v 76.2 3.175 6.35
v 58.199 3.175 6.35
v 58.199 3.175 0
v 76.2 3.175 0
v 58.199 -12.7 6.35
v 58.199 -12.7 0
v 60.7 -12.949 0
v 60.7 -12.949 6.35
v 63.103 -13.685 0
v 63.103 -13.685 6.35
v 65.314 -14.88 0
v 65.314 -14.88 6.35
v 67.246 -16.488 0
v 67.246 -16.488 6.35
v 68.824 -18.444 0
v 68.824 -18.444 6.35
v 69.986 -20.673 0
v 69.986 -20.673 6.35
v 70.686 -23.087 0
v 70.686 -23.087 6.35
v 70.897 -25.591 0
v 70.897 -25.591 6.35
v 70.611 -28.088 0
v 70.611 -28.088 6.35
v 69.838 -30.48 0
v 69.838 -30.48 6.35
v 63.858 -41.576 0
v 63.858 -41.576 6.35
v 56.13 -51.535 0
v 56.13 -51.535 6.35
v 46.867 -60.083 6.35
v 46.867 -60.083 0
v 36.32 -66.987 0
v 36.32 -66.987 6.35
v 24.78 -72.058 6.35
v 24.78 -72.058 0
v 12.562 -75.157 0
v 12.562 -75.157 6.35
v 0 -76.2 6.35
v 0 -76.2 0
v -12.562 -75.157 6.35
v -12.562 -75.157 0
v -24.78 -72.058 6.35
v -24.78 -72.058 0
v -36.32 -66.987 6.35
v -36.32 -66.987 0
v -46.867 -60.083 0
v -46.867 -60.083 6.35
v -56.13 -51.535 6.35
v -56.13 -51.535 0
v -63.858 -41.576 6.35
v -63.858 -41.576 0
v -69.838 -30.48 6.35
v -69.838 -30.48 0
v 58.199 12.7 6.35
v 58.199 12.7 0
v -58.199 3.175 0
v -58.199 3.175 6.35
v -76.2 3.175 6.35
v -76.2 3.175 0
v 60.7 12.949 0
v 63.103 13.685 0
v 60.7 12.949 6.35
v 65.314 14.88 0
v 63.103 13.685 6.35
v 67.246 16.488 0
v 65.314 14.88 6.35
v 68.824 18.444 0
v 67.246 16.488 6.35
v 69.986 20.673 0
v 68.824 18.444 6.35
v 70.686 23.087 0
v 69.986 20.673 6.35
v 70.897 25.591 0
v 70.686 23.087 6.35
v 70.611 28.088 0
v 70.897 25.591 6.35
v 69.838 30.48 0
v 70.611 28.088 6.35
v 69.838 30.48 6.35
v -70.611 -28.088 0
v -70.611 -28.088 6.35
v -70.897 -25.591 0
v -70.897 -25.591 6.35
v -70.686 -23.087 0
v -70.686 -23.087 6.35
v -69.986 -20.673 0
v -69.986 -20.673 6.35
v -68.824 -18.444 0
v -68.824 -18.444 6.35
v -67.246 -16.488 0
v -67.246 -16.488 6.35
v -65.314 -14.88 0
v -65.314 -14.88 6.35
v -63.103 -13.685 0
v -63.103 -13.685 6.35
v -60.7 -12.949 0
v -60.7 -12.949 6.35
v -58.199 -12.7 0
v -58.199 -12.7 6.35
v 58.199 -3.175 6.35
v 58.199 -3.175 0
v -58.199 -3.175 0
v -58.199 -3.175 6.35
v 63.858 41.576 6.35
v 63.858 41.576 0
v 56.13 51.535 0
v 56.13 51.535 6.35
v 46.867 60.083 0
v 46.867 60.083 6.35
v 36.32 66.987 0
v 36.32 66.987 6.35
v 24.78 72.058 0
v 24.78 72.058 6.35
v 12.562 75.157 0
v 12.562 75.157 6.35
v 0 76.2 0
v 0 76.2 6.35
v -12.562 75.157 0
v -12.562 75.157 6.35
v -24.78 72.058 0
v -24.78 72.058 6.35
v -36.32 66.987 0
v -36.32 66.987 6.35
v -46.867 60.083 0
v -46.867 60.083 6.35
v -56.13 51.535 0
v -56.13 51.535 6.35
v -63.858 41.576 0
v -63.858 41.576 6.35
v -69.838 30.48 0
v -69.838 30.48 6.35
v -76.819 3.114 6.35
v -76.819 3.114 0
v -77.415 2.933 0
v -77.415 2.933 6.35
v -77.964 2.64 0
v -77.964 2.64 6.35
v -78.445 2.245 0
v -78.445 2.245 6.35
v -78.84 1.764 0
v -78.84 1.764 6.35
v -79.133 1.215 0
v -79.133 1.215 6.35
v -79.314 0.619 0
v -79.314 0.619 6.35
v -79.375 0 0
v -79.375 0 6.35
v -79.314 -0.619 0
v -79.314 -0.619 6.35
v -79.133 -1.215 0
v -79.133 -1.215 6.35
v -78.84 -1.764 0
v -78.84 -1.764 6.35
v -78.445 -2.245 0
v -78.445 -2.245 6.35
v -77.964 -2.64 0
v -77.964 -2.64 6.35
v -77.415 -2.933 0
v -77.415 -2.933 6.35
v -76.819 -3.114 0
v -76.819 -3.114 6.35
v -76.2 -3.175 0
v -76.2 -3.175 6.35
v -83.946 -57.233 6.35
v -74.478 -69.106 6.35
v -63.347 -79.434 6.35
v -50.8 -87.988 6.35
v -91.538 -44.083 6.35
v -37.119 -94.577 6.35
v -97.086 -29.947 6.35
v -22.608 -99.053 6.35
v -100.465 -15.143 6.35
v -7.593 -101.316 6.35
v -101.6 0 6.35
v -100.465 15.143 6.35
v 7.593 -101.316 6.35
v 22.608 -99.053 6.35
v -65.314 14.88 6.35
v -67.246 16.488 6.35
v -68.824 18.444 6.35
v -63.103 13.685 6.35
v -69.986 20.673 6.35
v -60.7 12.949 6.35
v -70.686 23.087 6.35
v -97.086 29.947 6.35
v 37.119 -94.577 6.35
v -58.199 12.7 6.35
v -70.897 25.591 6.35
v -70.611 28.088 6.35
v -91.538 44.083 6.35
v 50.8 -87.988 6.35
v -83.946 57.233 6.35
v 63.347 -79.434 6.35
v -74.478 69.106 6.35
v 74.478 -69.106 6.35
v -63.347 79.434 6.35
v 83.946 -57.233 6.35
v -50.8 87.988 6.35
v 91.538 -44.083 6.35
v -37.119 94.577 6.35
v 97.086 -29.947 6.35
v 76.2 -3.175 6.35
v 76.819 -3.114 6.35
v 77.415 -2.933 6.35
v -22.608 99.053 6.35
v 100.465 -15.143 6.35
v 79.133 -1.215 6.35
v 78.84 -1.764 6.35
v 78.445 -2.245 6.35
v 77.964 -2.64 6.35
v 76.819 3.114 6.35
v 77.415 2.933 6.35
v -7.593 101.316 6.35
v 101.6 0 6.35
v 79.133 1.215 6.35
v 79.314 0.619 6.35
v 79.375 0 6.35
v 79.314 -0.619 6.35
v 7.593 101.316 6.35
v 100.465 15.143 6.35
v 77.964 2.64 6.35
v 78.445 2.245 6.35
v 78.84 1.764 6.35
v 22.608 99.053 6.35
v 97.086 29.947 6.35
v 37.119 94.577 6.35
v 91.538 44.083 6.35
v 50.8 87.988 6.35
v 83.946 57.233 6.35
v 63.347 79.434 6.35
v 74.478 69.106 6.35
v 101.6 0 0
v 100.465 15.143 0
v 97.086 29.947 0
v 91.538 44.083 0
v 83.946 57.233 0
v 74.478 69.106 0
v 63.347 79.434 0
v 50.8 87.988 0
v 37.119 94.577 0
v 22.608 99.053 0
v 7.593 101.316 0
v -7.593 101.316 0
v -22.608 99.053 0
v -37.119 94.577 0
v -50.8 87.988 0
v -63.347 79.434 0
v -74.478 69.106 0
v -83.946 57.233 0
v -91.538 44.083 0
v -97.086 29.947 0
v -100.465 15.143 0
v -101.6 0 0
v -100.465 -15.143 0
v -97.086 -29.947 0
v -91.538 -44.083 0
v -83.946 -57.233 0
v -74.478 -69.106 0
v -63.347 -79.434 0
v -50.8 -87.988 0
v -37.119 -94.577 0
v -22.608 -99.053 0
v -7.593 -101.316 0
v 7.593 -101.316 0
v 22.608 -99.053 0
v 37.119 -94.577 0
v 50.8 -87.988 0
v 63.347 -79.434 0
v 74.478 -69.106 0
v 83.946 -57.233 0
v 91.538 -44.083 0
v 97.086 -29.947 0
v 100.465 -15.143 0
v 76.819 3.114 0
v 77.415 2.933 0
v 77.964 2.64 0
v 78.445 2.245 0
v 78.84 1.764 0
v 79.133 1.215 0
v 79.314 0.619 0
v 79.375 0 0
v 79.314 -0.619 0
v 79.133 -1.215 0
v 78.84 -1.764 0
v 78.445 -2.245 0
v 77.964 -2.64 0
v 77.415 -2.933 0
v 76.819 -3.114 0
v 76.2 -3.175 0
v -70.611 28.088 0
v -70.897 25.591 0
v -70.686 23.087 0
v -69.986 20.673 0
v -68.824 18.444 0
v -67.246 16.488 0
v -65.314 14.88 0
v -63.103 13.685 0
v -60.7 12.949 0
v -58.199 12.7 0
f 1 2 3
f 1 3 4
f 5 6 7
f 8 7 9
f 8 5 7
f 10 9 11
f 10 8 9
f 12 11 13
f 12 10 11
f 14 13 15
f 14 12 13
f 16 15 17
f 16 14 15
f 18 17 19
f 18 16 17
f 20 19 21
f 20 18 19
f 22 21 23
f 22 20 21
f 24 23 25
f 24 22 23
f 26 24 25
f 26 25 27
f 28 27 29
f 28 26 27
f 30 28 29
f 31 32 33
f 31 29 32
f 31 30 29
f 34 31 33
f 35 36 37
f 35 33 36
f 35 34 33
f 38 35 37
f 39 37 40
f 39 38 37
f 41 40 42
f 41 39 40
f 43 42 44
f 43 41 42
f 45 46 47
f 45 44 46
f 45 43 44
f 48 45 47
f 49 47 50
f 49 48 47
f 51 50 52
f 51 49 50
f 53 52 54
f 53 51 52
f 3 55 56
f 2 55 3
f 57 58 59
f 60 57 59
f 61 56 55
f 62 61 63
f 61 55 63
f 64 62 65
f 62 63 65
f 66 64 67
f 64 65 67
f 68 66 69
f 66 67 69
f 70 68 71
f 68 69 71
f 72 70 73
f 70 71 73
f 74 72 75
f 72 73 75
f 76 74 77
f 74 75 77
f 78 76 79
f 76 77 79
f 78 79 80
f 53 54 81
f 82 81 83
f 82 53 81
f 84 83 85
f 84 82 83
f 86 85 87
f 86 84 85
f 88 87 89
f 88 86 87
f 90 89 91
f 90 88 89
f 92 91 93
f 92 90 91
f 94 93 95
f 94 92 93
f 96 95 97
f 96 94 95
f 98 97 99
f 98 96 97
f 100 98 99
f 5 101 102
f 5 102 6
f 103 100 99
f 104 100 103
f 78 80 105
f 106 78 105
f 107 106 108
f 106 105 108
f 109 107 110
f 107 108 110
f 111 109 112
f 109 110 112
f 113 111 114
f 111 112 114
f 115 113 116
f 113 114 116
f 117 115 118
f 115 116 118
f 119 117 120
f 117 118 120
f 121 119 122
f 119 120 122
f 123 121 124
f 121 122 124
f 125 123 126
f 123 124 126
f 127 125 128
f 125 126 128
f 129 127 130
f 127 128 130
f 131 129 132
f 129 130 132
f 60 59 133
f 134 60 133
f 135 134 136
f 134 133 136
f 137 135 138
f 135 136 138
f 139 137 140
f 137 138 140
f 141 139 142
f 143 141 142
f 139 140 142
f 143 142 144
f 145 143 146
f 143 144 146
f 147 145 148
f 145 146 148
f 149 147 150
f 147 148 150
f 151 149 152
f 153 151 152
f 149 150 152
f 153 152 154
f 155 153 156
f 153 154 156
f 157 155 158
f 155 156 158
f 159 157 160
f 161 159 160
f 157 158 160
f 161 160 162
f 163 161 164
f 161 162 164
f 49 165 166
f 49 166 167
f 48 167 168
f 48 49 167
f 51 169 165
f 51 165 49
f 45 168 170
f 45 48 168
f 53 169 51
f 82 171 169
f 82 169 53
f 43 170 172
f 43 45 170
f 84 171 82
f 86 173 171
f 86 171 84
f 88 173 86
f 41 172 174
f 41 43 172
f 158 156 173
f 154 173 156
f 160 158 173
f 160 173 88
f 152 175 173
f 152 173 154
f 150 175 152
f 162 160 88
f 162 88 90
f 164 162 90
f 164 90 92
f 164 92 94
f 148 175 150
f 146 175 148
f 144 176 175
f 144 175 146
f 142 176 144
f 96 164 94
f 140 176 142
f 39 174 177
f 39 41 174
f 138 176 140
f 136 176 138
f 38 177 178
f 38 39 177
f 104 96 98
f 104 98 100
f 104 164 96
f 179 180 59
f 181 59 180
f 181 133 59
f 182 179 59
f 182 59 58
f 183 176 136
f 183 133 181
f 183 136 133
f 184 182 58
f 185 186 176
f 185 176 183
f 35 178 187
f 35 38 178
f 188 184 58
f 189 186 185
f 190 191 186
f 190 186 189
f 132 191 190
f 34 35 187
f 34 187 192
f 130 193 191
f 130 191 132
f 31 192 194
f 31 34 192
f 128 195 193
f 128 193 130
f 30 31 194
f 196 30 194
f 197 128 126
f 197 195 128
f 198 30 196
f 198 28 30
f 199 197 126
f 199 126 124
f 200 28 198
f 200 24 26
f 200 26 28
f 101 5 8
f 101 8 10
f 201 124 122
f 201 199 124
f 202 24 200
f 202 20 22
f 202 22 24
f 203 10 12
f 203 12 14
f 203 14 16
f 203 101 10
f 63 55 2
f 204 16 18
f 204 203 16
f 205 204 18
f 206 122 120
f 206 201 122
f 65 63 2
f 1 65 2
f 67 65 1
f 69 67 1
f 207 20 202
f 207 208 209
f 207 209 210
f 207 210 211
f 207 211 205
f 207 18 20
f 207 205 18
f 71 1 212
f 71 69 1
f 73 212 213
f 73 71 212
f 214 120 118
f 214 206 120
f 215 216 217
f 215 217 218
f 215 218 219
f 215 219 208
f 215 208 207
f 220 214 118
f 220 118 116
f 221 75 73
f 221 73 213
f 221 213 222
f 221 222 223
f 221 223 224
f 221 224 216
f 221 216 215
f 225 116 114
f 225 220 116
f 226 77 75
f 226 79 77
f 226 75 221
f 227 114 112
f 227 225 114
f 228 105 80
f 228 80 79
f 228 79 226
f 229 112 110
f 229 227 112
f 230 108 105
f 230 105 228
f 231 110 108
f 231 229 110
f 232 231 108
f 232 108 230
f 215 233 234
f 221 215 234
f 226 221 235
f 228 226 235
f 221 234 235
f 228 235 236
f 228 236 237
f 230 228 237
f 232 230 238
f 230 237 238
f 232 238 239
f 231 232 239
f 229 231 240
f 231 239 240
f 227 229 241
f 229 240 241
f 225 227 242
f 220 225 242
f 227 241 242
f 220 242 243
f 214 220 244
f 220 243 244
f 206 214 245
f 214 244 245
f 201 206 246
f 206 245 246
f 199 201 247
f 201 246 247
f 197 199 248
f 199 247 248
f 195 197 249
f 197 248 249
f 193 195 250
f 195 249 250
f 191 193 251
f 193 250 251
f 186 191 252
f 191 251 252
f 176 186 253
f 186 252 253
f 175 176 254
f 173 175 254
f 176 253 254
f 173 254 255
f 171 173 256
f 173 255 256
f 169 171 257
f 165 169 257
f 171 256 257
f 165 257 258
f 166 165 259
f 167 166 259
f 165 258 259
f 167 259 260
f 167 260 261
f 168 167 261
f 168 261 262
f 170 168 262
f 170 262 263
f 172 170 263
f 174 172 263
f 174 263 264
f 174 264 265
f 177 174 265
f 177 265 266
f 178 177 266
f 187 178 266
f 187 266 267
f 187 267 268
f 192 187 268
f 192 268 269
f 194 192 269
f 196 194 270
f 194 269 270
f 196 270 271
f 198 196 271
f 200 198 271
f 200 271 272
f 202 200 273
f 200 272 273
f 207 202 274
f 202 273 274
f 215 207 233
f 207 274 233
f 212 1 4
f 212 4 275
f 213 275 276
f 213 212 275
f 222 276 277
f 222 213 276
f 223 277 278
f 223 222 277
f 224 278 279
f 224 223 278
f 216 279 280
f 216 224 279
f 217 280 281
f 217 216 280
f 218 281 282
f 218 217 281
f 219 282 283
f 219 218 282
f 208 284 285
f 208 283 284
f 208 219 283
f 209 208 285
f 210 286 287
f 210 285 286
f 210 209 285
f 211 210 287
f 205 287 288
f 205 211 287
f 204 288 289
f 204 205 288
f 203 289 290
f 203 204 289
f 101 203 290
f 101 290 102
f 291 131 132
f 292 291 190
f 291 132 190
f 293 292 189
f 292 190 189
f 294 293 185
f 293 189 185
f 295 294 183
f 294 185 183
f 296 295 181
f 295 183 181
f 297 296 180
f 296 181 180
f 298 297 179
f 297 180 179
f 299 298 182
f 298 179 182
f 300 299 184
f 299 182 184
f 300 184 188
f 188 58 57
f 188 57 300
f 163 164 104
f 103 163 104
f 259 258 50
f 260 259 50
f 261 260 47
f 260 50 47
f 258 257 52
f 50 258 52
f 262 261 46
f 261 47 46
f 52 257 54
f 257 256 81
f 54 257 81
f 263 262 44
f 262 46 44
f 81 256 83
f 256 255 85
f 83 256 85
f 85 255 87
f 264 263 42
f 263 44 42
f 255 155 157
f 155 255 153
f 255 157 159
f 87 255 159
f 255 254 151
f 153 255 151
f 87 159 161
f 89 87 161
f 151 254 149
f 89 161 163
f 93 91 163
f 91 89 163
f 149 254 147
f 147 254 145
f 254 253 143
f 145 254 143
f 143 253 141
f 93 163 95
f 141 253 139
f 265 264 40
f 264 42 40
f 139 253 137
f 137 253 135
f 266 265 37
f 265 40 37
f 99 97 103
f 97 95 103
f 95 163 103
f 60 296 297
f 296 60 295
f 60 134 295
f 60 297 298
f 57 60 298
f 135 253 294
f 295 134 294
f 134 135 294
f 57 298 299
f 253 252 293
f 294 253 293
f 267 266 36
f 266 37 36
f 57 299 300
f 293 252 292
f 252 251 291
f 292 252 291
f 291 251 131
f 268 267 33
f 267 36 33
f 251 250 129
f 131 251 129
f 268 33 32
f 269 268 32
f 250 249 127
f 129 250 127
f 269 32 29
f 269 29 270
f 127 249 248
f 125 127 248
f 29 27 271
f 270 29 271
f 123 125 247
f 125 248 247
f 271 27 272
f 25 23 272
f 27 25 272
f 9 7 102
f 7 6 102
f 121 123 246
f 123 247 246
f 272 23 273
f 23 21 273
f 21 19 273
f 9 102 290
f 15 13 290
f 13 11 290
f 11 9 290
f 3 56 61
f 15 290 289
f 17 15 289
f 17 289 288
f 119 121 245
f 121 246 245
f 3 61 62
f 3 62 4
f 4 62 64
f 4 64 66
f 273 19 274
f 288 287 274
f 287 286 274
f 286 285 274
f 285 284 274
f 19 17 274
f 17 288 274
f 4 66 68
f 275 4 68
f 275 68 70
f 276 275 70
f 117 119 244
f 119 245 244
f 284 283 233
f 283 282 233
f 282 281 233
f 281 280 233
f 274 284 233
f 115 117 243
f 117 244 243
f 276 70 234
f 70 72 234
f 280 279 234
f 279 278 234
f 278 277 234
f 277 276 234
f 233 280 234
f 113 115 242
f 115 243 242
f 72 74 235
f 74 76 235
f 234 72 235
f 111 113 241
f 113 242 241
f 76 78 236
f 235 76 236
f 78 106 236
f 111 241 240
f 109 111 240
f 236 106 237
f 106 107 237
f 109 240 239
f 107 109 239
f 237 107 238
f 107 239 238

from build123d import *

# Parameters (mm, degrees)
SKETCH1_R           = 101.6
BOSS_EXTRUDE1_DEPTH = 6.35
SKETCH2_R           = 25.4
CUT_EXTRUDE1_DEPTH  = 7.35
CUT_EXTRUDE2_DEPTH  = 7.35
CUT_EXTRUDE3_DEPTH  = 7.35
CUT_EXTRUDE10_DEPTH = 7.35


with BuildPart() as part:
    # Sketch1 → Boss-Extrude1 (new body)
    with BuildSketch(Plane.XY):
        Circle(SKETCH1_R)
    extrude(amount=BOSS_EXTRUDE1_DEPTH)

    # Sketch2 → Cut-Extrude1 (cut, through all)
    with BuildSketch(Plane.XY.offset(6.35)):
        Circle(SKETCH2_R)
    extrude(amount=-CUT_EXTRUDE1_DEPTH, mode=Mode.SUBTRACT)

    # Sketch3 → Cut-Extrude2 (cut, through all)
    with BuildSketch(Plane.XY.offset(6.35)):
        with BuildLine():
            ThreePointArc((69.838453591, 30.48), (0, 76.2), (-69.838453591, 30.48))
            ThreePointArc((-69.838453591, 30.48), (-63.278711326, 13.760257735), (-46.558969061, 20.32))
            ThreePointArc((-46.558969061, 20.32), (0, 50.8), (46.558969061, 20.32))
            ThreePointArc((46.558969061, 20.32), (63.278711326, 13.760257735), (69.838453591, 30.48))
        make_face()
    cut_extrude2 = extrude(amount=-CUT_EXTRUDE2_DEPTH, mode=Mode.SUBTRACT)

    # Mirror1: Cut-Extrude2 across plane
    add(cut_extrude2.mirror(Plane.ZX), mode=Mode.SUBTRACT)

    # Sketch4 → Cut-Extrude3 (cut, through all)
    with BuildSketch(Plane.XY.offset(6.35)):
        with BuildLine():
            Line((76.2, -3.175), (25.4, -3.175))
            ThreePointArc((25.4, -3.175), (22.225, 0), (25.4, 3.175))
            Line((25.4, 3.175), (76.2, 3.175))
            ThreePointArc((76.2, 3.175), (79.375, 0), (76.2, -3.175))
        make_face()
        with BuildLine():
            Line((-76.2, -3.175), (-25.4, -3.175))
            ThreePointArc((-25.4, -3.175), (-22.225, 0), (-25.4, 3.175))
            Line((-25.4, 3.175), (-76.2, 3.175))
            ThreePointArc((-76.2, 3.175), (-79.375, 0), (-76.2, -3.175))
        make_face()
    extrude(amount=-CUT_EXTRUDE3_DEPTH, mode=Mode.SUBTRACT)

    # Sketch14 → Cut-Extrude10 (cut, through all)
    with BuildSketch(Plane.XY.offset(6.35)):
        with BuildLine():
            Line((-58.198711326, -12.7), (-58.198711326, 12.7))
            ThreePointArc((-58.198711326, 12.7), (-51.242634846, 14.774417663), (-46.558969061, 20.32))
            ThreePointArc((-46.558969061, 20.32), (0, 50.8), (46.558969061, 20.32))
            ThreePointArc((46.558969061, 20.32), (51.242634846, 14.774417663), (58.198711326, 12.7))
            Line((58.198711326, 12.7), (58.198711326, -12.7))
            ThreePointArc((58.198711326, -12.7), (51.242634846, -14.774417663), (46.558969061, -20.32))
            ThreePointArc((46.558969061, -20.32), (0, -50.8), (-46.558969061, -20.32))
            ThreePointArc((-46.558969061, -20.32), (-51.242634846, -14.774417663), (-58.198711326, -12.7))
        make_face()
    extrude(amount=-CUT_EXTRUDE10_DEPTH, mode=Mode.SUBTRACT)


solid = part.part
